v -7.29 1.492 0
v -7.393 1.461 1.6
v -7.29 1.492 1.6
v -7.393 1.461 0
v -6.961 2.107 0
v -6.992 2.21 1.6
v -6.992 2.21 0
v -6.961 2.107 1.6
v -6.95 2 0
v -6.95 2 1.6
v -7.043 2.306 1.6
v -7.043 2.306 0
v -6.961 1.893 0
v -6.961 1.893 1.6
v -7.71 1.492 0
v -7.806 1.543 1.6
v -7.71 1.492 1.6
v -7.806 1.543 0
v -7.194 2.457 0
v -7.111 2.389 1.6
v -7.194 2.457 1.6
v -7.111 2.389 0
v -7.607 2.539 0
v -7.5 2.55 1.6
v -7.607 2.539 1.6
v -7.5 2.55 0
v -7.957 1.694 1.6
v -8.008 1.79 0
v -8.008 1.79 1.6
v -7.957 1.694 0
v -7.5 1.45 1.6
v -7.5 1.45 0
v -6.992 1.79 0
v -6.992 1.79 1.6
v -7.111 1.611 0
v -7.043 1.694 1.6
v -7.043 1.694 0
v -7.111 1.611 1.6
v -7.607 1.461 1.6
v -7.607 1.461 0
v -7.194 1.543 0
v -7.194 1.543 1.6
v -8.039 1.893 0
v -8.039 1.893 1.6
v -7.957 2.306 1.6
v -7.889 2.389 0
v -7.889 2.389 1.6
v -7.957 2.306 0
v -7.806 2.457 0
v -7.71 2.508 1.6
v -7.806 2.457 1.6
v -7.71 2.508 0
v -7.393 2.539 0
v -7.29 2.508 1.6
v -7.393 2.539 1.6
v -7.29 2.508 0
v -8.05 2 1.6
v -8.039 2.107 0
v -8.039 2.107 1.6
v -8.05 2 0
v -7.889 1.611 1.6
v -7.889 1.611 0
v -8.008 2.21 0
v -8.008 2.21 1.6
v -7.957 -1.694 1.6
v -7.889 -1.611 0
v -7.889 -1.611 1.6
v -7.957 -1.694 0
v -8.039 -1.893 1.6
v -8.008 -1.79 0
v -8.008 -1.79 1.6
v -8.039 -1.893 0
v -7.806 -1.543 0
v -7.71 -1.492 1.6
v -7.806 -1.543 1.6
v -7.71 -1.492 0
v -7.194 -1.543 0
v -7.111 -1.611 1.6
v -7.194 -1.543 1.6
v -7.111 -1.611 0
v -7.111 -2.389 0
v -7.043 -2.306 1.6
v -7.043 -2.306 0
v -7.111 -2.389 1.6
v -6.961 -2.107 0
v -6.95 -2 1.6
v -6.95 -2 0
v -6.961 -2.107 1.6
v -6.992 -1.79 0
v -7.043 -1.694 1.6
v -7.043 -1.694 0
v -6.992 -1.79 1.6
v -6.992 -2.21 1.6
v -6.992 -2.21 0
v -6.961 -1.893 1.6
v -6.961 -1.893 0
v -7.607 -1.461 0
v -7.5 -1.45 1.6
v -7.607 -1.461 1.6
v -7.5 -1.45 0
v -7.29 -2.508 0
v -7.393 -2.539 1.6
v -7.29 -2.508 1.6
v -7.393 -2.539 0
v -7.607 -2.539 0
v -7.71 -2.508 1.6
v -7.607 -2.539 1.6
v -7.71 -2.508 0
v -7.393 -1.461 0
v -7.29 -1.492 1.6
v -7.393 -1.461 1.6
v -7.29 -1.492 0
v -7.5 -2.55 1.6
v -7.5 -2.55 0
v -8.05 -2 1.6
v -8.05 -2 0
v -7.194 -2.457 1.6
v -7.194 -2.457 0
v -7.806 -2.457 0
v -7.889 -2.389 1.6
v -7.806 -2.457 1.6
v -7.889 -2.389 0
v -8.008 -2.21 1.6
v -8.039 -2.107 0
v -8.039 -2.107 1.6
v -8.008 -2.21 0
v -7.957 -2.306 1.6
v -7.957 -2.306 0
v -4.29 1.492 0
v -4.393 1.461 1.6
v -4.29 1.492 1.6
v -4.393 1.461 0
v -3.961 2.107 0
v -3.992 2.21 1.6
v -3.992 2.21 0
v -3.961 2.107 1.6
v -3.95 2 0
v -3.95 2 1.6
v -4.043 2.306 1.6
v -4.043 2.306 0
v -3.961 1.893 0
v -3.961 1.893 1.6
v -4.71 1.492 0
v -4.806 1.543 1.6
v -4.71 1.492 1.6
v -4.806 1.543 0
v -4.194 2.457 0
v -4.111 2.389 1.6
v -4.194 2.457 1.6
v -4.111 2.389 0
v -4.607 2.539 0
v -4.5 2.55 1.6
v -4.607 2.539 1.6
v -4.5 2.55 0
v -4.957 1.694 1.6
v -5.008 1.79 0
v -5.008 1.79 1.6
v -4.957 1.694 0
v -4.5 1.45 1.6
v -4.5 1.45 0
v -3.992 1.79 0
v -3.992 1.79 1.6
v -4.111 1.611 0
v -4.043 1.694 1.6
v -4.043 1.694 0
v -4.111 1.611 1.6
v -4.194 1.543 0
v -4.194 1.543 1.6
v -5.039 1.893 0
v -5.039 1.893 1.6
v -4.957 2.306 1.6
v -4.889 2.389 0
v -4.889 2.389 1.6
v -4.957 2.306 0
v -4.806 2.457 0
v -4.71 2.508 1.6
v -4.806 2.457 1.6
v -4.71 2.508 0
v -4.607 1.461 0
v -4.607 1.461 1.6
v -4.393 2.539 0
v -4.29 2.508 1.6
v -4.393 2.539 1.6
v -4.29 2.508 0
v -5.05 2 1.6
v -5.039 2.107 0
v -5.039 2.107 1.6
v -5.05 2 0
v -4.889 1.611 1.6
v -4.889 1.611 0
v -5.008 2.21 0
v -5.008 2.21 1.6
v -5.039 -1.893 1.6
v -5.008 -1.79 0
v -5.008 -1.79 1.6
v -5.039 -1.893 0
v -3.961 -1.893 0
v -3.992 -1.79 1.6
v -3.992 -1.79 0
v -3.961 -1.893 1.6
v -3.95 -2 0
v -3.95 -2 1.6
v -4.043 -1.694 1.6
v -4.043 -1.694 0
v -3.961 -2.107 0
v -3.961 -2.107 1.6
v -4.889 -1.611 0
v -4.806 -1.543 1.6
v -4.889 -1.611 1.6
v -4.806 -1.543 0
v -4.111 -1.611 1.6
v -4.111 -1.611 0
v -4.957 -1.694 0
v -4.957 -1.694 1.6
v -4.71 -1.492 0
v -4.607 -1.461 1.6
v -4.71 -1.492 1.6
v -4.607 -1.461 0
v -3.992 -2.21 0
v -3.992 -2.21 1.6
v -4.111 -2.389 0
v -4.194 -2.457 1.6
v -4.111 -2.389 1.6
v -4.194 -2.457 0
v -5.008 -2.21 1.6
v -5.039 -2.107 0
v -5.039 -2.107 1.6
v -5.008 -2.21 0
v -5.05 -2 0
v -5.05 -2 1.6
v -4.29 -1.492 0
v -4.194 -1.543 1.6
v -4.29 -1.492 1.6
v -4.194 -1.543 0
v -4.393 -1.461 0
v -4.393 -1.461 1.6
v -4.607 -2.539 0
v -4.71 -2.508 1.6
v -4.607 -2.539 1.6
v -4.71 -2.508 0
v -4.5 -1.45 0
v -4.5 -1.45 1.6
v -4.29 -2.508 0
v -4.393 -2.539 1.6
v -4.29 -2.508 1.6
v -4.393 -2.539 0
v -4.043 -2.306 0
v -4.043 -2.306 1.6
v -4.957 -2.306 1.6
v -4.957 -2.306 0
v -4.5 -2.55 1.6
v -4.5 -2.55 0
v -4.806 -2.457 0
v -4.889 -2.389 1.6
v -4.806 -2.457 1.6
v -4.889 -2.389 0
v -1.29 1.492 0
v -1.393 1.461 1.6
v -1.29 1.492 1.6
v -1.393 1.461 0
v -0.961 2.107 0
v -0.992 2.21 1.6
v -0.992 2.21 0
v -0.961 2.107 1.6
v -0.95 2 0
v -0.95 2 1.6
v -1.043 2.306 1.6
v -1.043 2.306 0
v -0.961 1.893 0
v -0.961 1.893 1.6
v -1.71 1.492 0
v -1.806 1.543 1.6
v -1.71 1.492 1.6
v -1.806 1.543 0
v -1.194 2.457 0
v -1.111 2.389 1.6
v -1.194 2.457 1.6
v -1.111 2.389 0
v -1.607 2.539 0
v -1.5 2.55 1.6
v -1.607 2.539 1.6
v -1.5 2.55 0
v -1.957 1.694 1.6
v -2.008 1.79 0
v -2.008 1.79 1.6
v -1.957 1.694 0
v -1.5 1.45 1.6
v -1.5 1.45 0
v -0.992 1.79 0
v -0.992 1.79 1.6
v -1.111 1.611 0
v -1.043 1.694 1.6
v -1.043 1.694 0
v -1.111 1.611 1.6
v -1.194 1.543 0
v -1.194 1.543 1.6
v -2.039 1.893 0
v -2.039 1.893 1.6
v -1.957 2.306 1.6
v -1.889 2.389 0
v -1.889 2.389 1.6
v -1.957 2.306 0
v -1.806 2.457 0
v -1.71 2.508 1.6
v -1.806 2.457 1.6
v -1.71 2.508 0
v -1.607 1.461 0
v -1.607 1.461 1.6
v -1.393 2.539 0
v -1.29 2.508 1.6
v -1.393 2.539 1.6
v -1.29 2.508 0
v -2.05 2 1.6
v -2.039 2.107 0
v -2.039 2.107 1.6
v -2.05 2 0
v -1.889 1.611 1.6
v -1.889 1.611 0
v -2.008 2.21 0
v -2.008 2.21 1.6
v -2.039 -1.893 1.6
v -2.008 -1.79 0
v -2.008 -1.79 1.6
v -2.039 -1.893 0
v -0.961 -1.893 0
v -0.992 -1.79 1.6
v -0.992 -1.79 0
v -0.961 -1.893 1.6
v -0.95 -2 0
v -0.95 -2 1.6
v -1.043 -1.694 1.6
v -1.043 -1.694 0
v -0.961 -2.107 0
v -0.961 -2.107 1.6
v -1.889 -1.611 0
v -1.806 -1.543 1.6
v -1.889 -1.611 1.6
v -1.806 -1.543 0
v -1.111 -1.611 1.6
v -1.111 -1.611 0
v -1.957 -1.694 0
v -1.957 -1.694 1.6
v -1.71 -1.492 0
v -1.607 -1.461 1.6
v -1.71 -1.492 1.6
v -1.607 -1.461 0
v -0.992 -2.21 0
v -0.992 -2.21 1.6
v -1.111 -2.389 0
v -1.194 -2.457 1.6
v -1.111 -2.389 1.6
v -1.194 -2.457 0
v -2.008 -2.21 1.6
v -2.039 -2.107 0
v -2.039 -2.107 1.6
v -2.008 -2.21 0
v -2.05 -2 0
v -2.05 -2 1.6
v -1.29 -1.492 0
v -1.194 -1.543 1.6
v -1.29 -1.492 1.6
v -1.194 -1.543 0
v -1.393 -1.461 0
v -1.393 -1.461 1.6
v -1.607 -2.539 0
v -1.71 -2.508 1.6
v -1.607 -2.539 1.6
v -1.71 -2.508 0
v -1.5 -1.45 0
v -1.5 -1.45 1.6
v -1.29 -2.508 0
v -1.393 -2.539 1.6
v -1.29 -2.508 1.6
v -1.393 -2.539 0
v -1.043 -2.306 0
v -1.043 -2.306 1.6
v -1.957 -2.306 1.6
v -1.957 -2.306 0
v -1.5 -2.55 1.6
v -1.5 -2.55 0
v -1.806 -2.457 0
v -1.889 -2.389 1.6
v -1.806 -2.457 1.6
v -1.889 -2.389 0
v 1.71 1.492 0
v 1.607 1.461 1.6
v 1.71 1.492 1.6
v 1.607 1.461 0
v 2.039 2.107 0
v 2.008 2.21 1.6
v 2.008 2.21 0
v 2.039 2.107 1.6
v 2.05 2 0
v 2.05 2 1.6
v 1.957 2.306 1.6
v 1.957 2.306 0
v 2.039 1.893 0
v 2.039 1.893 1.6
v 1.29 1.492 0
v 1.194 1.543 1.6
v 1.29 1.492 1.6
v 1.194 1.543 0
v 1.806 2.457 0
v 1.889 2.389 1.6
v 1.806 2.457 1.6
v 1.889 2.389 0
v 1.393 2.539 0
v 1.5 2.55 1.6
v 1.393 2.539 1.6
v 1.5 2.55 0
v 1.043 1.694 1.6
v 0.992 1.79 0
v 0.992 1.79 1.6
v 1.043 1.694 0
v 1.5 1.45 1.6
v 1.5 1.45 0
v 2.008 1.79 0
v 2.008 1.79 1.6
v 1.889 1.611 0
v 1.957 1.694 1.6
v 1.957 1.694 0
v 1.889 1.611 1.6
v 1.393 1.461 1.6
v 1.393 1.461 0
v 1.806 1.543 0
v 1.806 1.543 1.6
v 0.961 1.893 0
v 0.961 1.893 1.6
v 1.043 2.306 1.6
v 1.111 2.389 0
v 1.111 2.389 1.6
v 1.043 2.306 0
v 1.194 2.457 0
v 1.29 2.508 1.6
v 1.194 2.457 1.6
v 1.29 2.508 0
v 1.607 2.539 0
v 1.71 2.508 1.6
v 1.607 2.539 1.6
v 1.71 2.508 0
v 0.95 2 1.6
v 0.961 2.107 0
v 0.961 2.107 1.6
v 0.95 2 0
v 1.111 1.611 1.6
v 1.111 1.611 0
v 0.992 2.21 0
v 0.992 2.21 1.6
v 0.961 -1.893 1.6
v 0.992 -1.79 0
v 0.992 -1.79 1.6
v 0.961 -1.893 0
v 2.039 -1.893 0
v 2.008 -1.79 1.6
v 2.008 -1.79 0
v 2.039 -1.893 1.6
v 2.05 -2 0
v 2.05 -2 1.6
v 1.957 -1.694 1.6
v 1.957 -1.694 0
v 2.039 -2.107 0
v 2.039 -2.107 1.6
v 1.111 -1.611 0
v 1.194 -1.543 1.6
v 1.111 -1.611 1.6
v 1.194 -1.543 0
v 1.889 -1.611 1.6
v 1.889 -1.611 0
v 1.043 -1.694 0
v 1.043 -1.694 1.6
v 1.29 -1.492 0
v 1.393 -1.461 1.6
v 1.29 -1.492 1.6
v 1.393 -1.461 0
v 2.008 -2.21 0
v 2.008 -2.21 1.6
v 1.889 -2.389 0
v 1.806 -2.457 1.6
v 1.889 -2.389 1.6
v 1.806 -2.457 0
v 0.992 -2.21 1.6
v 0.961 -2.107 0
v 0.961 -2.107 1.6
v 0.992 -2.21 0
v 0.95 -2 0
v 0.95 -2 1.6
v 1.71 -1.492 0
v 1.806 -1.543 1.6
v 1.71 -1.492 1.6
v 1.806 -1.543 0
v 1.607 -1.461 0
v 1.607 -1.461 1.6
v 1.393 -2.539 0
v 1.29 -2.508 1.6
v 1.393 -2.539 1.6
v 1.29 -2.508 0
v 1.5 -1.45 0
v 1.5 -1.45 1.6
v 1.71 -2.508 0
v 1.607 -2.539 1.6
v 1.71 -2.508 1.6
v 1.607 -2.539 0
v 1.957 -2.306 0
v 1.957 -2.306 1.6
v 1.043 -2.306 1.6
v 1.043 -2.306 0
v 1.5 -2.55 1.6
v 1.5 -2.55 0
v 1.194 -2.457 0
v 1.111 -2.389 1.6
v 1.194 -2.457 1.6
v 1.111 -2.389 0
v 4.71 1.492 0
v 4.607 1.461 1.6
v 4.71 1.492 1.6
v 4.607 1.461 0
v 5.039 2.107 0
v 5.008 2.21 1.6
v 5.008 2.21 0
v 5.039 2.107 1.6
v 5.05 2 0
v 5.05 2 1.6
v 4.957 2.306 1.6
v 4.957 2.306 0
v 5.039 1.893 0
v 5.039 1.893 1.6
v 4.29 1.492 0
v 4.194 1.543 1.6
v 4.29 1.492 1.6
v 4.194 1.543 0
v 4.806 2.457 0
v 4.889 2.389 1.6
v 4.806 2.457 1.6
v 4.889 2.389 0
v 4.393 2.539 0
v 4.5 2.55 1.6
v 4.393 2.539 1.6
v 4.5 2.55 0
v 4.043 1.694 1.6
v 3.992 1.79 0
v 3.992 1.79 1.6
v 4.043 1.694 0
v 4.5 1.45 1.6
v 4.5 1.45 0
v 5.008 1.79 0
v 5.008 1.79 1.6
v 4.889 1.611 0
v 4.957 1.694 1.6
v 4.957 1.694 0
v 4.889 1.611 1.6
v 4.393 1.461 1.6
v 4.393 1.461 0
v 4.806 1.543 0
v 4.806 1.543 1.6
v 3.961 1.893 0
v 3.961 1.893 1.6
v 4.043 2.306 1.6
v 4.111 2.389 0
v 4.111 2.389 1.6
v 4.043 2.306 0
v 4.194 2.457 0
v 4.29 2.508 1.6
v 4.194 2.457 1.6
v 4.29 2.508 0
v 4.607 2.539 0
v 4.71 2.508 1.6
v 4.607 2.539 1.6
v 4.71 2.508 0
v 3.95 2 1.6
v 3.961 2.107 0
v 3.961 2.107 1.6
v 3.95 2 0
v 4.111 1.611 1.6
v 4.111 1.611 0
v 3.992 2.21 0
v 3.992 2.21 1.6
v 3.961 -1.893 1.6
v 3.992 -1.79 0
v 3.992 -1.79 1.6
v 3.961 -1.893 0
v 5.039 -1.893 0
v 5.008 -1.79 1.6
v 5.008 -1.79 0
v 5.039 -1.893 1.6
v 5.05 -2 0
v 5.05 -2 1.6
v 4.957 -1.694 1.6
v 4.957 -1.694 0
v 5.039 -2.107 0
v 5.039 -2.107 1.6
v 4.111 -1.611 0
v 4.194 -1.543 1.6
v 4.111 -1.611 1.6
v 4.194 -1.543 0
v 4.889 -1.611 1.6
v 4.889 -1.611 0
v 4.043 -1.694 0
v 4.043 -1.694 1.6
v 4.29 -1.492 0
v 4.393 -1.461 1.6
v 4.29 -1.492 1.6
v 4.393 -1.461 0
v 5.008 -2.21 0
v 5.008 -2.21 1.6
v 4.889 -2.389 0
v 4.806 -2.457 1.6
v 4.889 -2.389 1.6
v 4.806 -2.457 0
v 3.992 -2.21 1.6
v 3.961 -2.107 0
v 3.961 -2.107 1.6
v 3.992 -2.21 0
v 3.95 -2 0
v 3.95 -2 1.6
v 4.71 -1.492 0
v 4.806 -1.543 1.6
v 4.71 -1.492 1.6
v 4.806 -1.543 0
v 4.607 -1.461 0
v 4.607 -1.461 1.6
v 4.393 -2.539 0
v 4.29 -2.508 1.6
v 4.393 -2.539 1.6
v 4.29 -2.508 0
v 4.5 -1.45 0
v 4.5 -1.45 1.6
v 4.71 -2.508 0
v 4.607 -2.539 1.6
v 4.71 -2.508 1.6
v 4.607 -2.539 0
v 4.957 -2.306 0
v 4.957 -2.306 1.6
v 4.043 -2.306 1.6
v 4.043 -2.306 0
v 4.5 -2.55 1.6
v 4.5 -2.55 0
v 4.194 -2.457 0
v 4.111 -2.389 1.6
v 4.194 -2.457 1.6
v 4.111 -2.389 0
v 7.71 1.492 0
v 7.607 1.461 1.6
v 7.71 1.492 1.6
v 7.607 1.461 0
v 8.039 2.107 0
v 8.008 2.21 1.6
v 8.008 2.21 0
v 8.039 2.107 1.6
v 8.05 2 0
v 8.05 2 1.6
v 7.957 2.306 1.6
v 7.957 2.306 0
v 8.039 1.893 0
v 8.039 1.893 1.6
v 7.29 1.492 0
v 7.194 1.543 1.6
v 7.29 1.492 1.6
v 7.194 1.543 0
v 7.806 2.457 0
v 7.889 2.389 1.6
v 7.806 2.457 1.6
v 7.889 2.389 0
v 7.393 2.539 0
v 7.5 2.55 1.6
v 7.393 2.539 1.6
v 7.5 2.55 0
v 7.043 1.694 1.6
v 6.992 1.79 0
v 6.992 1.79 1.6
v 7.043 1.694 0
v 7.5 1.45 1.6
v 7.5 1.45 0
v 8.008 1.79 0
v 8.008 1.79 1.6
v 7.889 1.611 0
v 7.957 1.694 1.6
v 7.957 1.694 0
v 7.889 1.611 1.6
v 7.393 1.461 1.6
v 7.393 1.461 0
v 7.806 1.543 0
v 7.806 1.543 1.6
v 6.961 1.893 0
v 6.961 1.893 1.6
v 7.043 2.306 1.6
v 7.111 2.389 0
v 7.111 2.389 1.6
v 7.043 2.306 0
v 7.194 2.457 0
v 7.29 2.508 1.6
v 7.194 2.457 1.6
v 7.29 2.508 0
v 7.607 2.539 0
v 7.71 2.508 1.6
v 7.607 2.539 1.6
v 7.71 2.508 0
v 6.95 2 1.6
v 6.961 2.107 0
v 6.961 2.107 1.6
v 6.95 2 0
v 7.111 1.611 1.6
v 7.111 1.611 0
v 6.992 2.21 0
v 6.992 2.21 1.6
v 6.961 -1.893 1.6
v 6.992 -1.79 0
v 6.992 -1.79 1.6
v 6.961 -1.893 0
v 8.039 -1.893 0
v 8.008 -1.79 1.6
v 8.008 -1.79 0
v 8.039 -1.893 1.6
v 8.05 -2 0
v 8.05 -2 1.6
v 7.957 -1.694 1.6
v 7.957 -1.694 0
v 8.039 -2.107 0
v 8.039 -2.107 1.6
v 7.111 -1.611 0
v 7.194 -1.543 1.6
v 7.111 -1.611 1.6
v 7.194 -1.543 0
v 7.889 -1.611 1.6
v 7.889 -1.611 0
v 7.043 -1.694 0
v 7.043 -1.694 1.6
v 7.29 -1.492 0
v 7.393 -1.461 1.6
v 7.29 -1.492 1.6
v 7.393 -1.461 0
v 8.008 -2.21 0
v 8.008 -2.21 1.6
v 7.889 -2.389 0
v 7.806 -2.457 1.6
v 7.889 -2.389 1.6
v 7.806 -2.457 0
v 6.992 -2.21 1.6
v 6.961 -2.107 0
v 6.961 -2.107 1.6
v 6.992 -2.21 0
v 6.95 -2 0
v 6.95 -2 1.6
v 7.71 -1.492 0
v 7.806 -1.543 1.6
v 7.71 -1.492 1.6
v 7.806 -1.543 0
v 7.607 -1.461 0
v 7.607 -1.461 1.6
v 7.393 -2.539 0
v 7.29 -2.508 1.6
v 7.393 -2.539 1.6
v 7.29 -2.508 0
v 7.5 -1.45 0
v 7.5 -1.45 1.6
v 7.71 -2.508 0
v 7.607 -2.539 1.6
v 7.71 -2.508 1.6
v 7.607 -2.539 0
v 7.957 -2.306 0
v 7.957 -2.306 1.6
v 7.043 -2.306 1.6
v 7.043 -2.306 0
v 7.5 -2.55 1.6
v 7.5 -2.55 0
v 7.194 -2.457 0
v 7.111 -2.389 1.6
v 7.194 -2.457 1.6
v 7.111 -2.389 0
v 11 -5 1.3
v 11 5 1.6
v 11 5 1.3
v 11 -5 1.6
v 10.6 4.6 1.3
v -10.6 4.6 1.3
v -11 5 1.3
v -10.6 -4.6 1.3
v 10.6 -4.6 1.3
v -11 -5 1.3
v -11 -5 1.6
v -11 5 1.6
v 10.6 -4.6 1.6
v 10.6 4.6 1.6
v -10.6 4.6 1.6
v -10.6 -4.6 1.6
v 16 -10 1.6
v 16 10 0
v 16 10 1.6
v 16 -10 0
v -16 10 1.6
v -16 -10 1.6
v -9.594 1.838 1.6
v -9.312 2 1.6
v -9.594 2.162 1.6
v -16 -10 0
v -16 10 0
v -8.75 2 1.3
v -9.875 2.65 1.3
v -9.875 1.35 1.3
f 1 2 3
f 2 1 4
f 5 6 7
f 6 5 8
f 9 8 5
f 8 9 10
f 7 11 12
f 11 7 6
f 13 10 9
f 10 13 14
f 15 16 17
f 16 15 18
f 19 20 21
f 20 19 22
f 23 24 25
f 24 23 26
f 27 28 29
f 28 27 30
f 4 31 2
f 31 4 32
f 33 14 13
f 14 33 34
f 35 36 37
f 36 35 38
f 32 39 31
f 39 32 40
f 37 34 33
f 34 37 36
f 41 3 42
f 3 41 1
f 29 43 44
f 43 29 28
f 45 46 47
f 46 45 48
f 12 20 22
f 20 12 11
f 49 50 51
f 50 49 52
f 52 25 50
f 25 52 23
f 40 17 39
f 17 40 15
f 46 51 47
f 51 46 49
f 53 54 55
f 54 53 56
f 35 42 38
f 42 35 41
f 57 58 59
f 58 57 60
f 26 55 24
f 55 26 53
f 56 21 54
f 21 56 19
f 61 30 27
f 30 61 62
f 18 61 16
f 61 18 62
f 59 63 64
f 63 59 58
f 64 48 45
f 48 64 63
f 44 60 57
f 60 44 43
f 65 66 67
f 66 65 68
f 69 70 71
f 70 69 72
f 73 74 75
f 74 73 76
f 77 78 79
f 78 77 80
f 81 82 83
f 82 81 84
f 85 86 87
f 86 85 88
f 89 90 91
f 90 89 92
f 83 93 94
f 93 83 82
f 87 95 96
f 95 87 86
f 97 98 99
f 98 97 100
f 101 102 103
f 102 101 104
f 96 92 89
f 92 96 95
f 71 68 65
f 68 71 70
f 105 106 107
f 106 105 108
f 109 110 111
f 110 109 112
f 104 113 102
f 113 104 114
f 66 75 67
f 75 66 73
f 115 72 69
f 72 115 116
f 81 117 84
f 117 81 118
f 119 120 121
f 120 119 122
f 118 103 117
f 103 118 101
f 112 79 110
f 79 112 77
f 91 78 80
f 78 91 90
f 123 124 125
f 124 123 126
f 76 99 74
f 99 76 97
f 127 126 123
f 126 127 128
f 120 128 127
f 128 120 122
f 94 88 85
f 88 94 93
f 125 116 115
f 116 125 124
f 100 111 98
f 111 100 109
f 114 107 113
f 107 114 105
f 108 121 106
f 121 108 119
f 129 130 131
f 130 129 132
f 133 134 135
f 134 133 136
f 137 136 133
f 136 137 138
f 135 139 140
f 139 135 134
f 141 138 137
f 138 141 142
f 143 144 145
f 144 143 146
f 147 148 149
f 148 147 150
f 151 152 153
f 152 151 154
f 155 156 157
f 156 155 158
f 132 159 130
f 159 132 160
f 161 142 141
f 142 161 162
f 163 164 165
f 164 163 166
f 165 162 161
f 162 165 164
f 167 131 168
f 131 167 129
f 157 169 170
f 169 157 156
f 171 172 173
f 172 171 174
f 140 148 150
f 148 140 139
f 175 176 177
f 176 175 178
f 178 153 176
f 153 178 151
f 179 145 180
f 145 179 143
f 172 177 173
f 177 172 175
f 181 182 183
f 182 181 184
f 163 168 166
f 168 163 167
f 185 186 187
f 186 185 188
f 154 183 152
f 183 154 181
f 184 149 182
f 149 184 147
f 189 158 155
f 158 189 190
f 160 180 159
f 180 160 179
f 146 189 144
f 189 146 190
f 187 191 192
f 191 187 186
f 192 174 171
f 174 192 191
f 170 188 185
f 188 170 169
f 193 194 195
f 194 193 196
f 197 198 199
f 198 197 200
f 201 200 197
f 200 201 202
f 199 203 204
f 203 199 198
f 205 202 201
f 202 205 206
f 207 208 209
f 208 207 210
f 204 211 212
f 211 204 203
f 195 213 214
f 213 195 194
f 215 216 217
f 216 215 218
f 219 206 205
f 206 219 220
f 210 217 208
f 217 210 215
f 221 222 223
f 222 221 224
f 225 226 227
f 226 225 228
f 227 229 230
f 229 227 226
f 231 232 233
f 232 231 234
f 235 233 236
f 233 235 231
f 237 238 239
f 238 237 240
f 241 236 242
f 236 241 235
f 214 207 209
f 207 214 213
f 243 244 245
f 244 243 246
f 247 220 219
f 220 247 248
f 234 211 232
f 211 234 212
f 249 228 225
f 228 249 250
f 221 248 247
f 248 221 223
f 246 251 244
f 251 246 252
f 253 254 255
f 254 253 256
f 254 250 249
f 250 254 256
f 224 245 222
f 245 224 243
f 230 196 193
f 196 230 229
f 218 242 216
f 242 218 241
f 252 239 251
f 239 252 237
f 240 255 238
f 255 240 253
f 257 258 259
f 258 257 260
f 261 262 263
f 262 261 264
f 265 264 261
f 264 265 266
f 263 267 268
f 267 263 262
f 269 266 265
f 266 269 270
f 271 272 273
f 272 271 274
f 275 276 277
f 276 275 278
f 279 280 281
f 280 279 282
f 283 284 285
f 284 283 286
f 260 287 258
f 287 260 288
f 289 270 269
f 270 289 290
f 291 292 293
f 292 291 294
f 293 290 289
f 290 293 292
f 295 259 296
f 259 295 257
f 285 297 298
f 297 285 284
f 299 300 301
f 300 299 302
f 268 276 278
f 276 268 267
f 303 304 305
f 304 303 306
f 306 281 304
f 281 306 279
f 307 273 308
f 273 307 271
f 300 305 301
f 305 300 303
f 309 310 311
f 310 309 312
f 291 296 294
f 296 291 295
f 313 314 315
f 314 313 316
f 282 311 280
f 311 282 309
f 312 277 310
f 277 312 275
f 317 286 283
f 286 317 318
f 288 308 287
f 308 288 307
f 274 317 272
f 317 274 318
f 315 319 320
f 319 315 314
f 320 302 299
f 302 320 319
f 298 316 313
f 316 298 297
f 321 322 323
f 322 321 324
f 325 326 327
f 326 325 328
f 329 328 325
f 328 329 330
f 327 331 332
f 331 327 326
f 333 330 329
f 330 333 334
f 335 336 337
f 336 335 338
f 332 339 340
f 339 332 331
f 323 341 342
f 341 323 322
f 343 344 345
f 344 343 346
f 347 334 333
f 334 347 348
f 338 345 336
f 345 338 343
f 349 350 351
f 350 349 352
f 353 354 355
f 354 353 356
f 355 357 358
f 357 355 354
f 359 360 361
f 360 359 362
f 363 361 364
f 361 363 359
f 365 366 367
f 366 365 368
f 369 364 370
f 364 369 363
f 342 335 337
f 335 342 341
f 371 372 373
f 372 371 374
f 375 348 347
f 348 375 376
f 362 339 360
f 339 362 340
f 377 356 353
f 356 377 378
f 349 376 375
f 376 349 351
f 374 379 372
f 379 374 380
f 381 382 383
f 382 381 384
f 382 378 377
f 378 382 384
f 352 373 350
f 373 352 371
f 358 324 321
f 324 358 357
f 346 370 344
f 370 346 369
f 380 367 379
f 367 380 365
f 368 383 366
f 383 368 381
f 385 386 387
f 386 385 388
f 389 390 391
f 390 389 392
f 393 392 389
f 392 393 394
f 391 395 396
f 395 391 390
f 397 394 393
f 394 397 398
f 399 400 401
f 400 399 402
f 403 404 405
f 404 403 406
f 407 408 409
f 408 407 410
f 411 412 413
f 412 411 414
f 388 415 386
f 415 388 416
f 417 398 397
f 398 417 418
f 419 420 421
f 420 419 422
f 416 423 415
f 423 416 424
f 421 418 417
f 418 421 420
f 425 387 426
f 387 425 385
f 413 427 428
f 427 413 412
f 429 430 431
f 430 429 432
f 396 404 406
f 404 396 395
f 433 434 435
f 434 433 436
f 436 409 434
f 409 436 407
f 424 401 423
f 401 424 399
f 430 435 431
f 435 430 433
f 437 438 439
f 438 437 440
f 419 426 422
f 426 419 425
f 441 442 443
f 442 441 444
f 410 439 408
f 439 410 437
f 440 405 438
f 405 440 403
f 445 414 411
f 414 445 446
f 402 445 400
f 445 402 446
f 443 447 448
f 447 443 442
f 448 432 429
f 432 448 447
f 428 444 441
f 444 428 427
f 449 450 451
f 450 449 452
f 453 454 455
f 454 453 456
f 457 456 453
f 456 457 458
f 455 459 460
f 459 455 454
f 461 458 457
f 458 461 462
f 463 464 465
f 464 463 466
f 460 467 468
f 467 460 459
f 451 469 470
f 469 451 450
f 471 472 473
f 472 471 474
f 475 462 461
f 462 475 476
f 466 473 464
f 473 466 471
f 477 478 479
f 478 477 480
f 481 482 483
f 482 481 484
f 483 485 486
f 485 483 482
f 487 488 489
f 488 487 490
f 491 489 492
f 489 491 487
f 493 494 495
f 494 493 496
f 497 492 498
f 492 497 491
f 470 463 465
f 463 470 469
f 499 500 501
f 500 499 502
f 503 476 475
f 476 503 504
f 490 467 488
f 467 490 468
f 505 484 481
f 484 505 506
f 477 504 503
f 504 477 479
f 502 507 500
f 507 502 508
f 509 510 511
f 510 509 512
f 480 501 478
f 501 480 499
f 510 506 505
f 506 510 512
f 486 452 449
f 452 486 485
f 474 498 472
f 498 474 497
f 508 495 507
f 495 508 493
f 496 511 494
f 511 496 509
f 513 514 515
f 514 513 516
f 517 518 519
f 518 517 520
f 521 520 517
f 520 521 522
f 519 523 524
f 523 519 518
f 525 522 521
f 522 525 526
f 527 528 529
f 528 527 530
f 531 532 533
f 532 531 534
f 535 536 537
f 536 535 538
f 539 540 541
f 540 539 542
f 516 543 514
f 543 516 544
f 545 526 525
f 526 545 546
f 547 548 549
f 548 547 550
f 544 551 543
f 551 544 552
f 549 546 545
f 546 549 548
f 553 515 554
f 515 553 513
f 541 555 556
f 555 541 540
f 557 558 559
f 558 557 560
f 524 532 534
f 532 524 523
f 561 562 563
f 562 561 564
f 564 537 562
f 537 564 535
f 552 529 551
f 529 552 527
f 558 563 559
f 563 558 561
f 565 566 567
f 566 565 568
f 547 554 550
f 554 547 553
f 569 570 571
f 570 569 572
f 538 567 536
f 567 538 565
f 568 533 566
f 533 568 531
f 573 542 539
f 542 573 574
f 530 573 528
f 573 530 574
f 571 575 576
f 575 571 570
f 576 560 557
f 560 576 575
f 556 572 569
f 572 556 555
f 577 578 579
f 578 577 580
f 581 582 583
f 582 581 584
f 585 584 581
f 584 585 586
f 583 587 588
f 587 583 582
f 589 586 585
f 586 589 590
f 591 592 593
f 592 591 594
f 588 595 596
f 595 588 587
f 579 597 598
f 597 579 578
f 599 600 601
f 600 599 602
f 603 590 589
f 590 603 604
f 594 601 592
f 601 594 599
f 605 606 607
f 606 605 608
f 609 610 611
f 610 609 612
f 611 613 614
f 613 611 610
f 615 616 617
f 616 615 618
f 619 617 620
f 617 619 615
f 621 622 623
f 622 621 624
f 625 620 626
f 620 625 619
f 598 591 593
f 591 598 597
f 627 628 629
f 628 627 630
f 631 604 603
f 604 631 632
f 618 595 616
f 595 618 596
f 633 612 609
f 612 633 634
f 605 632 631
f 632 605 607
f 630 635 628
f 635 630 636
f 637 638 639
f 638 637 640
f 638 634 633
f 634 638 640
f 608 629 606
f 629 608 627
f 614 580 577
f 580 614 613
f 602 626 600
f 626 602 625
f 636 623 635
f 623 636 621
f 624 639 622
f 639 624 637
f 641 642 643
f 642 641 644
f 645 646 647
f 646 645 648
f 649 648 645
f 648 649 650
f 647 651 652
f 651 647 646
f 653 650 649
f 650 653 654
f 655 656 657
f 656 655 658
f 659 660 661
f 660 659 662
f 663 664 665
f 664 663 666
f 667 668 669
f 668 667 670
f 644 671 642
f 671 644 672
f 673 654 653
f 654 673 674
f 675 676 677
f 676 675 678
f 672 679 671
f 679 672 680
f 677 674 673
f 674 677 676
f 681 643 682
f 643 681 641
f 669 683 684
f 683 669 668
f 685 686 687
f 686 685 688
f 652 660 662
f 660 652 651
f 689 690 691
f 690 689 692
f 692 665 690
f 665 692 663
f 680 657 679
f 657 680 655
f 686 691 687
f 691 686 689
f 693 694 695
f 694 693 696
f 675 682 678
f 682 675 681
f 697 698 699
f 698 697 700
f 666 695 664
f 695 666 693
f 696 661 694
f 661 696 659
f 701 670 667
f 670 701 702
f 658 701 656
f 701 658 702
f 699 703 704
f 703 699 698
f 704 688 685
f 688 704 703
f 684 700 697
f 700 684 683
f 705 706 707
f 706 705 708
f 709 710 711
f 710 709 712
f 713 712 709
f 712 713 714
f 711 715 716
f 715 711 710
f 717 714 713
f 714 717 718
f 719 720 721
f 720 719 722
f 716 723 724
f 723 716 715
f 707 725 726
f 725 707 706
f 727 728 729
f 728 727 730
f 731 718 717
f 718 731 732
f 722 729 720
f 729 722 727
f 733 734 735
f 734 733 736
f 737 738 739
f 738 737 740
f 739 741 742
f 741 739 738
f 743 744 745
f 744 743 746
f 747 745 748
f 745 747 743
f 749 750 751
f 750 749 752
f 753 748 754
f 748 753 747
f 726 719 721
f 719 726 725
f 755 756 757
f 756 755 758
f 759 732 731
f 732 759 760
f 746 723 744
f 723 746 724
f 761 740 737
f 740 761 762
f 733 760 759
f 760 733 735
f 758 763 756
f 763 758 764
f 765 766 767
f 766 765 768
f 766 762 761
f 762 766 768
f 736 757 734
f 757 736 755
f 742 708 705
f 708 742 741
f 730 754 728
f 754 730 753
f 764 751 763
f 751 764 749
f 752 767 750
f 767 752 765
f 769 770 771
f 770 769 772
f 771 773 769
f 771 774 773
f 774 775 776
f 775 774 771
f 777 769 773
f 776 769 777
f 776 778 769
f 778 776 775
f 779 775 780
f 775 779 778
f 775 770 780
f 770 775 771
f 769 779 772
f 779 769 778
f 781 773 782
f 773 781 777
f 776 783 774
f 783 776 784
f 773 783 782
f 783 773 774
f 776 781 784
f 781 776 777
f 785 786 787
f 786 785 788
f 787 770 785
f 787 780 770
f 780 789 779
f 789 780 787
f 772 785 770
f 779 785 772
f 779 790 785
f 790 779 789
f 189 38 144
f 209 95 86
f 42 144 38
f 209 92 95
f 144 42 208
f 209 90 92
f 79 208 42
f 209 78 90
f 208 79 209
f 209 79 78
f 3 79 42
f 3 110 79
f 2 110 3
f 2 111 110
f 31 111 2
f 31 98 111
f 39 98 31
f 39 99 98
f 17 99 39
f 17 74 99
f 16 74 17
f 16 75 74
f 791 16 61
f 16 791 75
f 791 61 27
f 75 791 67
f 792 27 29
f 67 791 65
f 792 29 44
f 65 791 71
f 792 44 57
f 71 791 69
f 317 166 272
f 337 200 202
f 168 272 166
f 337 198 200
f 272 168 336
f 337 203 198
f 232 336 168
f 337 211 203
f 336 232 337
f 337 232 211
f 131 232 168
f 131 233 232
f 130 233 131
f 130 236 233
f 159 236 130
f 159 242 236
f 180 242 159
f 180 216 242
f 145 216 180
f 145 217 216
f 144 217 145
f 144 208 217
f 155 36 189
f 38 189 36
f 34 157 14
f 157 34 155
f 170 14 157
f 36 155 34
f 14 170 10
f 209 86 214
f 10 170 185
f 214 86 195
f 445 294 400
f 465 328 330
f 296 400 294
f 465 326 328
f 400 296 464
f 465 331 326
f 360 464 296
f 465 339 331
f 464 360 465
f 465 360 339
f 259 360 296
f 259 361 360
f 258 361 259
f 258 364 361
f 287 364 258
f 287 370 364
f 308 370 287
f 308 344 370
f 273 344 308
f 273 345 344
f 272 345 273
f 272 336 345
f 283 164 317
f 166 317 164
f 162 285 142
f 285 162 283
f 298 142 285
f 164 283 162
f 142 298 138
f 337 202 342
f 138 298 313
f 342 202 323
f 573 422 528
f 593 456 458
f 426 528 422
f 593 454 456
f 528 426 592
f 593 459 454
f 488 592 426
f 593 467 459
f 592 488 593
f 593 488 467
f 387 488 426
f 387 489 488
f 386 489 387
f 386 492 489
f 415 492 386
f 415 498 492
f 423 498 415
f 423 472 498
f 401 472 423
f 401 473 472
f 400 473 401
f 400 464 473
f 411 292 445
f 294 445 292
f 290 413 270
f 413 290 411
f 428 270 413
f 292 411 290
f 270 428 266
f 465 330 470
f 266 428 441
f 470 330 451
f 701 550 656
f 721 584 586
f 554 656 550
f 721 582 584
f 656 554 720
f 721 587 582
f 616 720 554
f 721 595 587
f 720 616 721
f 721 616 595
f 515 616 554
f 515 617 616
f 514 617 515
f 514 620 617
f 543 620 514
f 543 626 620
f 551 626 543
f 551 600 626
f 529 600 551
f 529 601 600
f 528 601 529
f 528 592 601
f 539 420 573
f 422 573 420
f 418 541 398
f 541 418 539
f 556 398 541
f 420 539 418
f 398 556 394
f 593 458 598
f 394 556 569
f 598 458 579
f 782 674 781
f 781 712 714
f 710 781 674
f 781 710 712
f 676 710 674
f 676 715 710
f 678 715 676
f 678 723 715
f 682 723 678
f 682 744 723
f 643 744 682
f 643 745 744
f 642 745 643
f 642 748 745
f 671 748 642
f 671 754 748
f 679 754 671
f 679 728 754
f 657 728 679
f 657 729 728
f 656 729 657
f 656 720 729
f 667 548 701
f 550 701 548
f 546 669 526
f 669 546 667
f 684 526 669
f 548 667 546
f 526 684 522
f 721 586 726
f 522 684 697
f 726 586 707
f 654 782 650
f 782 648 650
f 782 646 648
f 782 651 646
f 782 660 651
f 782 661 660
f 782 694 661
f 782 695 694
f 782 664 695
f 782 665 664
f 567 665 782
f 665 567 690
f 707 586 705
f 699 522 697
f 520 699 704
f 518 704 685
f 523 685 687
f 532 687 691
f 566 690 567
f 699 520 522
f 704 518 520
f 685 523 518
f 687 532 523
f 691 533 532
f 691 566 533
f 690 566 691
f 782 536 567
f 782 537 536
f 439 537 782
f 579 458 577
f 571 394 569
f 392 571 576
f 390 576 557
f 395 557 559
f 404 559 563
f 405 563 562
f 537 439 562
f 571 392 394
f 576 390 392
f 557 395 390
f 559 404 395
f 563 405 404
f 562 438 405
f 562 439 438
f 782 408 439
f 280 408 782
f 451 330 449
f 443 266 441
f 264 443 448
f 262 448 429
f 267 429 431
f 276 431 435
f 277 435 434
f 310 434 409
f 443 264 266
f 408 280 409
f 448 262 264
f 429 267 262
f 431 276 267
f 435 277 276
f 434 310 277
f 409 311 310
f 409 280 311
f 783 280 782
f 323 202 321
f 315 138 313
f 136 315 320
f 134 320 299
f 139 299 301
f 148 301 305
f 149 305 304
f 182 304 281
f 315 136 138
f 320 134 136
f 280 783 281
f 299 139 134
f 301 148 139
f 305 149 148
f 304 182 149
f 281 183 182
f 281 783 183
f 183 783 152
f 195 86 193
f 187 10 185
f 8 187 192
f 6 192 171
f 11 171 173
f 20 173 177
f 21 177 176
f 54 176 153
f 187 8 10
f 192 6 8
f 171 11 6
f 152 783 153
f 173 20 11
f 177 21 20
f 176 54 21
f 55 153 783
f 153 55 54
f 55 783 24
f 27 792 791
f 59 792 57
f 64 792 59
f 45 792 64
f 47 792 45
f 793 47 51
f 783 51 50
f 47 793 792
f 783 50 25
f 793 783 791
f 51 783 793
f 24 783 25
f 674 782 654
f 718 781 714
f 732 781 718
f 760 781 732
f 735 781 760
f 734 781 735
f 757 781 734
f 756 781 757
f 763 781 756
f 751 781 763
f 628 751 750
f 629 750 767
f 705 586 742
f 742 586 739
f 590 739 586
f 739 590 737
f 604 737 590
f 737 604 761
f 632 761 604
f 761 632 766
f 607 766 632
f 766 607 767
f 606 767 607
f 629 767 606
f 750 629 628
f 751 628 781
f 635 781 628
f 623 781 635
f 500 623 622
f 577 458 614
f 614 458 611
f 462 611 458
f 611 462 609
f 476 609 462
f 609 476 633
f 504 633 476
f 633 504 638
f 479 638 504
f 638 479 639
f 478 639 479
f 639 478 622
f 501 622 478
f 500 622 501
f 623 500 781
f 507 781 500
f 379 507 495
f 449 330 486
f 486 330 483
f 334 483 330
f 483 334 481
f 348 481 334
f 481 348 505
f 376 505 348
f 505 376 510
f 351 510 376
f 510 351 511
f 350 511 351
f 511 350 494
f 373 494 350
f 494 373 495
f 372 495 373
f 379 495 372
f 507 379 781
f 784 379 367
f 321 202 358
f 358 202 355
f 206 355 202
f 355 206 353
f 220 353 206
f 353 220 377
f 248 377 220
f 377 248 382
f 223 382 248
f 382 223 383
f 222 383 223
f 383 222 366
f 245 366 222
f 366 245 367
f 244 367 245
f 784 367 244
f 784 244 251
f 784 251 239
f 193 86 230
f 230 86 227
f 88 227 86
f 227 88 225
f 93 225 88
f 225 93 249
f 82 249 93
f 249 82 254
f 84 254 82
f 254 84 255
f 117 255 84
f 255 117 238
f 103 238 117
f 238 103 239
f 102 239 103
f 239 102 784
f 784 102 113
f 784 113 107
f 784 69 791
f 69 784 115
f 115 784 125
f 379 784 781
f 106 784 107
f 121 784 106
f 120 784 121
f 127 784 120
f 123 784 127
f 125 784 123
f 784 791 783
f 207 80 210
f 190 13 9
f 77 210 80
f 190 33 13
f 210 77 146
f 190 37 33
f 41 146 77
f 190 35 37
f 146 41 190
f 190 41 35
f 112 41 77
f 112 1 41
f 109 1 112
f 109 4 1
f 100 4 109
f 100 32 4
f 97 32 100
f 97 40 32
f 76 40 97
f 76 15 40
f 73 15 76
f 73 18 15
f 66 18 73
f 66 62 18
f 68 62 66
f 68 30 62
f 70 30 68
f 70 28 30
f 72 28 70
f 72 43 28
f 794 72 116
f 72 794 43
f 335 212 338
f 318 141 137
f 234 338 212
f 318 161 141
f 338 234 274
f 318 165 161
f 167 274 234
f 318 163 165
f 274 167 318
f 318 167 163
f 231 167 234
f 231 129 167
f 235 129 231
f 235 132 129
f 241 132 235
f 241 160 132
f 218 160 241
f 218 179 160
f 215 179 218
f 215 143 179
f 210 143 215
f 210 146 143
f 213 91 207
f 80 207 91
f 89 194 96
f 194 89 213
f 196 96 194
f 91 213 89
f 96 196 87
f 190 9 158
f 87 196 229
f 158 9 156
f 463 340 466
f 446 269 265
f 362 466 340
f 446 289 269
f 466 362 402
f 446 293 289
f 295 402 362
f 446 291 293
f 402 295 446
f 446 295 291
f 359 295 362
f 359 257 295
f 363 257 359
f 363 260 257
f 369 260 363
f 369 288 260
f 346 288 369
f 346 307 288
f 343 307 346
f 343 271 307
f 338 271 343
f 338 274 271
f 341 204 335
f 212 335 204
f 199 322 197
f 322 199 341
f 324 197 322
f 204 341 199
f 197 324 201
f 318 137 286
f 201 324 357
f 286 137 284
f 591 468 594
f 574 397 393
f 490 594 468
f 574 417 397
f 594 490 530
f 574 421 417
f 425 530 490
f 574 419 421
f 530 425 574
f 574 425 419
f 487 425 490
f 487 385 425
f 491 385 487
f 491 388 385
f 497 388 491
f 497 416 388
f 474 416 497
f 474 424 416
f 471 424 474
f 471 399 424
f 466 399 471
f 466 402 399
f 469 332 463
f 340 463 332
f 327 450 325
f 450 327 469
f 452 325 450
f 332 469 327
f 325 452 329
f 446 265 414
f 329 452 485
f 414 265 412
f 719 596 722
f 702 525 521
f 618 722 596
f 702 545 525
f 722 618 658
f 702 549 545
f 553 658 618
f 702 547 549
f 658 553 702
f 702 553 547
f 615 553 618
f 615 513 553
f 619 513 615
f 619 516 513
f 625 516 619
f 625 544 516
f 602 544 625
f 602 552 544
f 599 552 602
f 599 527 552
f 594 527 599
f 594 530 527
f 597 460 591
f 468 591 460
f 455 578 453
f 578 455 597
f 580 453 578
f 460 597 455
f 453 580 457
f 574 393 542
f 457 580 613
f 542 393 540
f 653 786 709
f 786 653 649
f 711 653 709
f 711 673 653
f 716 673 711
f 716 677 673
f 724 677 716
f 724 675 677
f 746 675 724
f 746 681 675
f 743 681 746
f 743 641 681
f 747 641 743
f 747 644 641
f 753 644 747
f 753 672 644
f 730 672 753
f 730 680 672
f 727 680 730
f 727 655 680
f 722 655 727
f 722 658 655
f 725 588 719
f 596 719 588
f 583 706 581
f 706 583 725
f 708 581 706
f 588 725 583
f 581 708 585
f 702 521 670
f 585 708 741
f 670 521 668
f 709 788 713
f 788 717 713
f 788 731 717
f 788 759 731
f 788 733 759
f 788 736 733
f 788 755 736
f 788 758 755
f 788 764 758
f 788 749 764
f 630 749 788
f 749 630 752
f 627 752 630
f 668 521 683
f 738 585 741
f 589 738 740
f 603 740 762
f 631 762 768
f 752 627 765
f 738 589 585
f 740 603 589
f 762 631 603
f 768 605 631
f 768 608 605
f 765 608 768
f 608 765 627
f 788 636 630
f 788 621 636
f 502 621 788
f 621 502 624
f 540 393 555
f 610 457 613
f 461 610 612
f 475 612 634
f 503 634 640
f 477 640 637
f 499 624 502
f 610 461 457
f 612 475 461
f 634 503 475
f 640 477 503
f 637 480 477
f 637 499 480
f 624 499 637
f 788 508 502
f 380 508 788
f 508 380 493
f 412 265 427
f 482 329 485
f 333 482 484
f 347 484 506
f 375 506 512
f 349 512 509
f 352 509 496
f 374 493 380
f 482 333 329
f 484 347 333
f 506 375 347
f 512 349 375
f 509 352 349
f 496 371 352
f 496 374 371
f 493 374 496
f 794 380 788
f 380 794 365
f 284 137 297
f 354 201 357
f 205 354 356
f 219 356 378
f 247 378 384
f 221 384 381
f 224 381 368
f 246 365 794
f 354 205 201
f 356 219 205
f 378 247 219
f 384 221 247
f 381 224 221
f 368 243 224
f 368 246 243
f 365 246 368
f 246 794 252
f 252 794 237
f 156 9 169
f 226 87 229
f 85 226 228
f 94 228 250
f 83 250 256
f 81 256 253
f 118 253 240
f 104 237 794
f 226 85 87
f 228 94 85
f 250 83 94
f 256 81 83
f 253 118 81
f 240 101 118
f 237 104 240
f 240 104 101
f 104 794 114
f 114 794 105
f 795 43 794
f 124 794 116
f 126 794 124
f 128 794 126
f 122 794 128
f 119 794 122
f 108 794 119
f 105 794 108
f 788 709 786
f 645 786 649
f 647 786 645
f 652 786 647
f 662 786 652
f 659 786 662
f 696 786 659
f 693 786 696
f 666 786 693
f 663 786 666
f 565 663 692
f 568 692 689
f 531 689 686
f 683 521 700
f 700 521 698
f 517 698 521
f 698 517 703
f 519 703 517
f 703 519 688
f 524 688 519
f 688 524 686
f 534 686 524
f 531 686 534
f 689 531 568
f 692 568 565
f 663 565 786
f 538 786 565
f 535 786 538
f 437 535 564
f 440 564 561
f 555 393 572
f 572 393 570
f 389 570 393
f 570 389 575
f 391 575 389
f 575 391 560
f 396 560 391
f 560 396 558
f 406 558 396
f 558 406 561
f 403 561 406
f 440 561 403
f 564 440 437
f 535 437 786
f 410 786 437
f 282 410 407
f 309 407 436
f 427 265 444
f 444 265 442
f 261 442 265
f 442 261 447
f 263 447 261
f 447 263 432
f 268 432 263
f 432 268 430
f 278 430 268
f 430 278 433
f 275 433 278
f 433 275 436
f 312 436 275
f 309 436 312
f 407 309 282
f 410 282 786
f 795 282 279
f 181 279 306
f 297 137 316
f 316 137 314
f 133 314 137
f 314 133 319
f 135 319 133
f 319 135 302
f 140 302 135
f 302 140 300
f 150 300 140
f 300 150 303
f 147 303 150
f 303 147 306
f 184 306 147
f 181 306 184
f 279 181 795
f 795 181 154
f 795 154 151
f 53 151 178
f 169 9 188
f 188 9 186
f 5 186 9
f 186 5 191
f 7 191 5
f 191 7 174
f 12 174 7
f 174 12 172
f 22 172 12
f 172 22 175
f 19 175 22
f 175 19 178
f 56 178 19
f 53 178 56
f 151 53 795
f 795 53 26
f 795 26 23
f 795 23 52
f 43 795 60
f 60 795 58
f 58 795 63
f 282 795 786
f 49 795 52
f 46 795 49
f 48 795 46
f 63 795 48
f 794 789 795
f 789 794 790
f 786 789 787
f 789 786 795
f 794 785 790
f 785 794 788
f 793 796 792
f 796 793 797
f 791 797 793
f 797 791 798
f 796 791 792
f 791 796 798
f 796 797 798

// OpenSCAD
// SW4 (SS42H11-G9) Fit Test Jig
// Matches footprint in Batman_Forever_JAMMA_Adapter_V1.1.eprj exactly
//
// Pin pitch:    3.0mm (X)
// Row spacing:  4.0mm (Y)
// Hole dia:     1.1mm (signal pins)
// Grid:         2 rows x 6 cols, pins 1-6 top, 7-12 bottom
//
// Print at 100% scale, 0.1mm layer height for best accuracy
// Material: PLA is fine

// --- Parameters ---
pcb_thickness = 1.6;        // match real PCB thickness
margin = 5.0;               // border around pin area
pin_pitch_x = 3.0;          // 3mm column pitch
pin_pitch_y = 4.0;          // 4mm row spacing
pin_hole_dia = 1.1;         // 1.1mm drill for 0.8x0.4mm rectangular pins
cols = 6;
rows = 2;

// Body outline reference (for visual, slightly larger than pin area)
body_length = 22.0;         // switch body length
body_width = 10.0;          // switch body width

// Derived
pin_area_x = (cols - 1) * pin_pitch_x;  // 15mm
pin_area_y = (rows - 1) * pin_pitch_y;  // 4mm

jig_x = body_length + 2 * margin;       // 32mm
jig_y = body_width + 2 * margin;        // 20mm

difference() {
    // Base slab
    translate([-jig_x/2, -jig_y/2, 0])
        cube([jig_x, jig_y, pcb_thickness]);

    // Signal pin holes - 2 rows x 6 cols
    for (col = [0 : cols-1]) {
        for (row = [0 : rows-1]) {
            x = -pin_area_x/2 + col * pin_pitch_x;
            y = pin_area_y/2 - row * pin_pitch_y;
            translate([x, y, -0.1])
                cylinder(h = pcb_thickness + 0.2, d = pin_hole_dia, $fn = 32);
        }
    }

    // Body outline scribe (shallow groove on top surface for alignment reference)
    translate([-body_length/2, -body_width/2, pcb_thickness - 0.3])
        difference() {
            cube([body_length, body_width, 0.4]);
            translate([0.4, 0.4, -0.1])
                cube([body_length - 0.8, body_width - 0.8, 0.6]);
        }

    // Pin 1 marker (small triangle near pin 1 position)
    translate([-pin_area_x/2 - 2, pin_area_y/2, pcb_thickness - 0.3])
        cylinder(h = 0.4, d1 = 1.5, d2 = 0, $fn = 3);
}
